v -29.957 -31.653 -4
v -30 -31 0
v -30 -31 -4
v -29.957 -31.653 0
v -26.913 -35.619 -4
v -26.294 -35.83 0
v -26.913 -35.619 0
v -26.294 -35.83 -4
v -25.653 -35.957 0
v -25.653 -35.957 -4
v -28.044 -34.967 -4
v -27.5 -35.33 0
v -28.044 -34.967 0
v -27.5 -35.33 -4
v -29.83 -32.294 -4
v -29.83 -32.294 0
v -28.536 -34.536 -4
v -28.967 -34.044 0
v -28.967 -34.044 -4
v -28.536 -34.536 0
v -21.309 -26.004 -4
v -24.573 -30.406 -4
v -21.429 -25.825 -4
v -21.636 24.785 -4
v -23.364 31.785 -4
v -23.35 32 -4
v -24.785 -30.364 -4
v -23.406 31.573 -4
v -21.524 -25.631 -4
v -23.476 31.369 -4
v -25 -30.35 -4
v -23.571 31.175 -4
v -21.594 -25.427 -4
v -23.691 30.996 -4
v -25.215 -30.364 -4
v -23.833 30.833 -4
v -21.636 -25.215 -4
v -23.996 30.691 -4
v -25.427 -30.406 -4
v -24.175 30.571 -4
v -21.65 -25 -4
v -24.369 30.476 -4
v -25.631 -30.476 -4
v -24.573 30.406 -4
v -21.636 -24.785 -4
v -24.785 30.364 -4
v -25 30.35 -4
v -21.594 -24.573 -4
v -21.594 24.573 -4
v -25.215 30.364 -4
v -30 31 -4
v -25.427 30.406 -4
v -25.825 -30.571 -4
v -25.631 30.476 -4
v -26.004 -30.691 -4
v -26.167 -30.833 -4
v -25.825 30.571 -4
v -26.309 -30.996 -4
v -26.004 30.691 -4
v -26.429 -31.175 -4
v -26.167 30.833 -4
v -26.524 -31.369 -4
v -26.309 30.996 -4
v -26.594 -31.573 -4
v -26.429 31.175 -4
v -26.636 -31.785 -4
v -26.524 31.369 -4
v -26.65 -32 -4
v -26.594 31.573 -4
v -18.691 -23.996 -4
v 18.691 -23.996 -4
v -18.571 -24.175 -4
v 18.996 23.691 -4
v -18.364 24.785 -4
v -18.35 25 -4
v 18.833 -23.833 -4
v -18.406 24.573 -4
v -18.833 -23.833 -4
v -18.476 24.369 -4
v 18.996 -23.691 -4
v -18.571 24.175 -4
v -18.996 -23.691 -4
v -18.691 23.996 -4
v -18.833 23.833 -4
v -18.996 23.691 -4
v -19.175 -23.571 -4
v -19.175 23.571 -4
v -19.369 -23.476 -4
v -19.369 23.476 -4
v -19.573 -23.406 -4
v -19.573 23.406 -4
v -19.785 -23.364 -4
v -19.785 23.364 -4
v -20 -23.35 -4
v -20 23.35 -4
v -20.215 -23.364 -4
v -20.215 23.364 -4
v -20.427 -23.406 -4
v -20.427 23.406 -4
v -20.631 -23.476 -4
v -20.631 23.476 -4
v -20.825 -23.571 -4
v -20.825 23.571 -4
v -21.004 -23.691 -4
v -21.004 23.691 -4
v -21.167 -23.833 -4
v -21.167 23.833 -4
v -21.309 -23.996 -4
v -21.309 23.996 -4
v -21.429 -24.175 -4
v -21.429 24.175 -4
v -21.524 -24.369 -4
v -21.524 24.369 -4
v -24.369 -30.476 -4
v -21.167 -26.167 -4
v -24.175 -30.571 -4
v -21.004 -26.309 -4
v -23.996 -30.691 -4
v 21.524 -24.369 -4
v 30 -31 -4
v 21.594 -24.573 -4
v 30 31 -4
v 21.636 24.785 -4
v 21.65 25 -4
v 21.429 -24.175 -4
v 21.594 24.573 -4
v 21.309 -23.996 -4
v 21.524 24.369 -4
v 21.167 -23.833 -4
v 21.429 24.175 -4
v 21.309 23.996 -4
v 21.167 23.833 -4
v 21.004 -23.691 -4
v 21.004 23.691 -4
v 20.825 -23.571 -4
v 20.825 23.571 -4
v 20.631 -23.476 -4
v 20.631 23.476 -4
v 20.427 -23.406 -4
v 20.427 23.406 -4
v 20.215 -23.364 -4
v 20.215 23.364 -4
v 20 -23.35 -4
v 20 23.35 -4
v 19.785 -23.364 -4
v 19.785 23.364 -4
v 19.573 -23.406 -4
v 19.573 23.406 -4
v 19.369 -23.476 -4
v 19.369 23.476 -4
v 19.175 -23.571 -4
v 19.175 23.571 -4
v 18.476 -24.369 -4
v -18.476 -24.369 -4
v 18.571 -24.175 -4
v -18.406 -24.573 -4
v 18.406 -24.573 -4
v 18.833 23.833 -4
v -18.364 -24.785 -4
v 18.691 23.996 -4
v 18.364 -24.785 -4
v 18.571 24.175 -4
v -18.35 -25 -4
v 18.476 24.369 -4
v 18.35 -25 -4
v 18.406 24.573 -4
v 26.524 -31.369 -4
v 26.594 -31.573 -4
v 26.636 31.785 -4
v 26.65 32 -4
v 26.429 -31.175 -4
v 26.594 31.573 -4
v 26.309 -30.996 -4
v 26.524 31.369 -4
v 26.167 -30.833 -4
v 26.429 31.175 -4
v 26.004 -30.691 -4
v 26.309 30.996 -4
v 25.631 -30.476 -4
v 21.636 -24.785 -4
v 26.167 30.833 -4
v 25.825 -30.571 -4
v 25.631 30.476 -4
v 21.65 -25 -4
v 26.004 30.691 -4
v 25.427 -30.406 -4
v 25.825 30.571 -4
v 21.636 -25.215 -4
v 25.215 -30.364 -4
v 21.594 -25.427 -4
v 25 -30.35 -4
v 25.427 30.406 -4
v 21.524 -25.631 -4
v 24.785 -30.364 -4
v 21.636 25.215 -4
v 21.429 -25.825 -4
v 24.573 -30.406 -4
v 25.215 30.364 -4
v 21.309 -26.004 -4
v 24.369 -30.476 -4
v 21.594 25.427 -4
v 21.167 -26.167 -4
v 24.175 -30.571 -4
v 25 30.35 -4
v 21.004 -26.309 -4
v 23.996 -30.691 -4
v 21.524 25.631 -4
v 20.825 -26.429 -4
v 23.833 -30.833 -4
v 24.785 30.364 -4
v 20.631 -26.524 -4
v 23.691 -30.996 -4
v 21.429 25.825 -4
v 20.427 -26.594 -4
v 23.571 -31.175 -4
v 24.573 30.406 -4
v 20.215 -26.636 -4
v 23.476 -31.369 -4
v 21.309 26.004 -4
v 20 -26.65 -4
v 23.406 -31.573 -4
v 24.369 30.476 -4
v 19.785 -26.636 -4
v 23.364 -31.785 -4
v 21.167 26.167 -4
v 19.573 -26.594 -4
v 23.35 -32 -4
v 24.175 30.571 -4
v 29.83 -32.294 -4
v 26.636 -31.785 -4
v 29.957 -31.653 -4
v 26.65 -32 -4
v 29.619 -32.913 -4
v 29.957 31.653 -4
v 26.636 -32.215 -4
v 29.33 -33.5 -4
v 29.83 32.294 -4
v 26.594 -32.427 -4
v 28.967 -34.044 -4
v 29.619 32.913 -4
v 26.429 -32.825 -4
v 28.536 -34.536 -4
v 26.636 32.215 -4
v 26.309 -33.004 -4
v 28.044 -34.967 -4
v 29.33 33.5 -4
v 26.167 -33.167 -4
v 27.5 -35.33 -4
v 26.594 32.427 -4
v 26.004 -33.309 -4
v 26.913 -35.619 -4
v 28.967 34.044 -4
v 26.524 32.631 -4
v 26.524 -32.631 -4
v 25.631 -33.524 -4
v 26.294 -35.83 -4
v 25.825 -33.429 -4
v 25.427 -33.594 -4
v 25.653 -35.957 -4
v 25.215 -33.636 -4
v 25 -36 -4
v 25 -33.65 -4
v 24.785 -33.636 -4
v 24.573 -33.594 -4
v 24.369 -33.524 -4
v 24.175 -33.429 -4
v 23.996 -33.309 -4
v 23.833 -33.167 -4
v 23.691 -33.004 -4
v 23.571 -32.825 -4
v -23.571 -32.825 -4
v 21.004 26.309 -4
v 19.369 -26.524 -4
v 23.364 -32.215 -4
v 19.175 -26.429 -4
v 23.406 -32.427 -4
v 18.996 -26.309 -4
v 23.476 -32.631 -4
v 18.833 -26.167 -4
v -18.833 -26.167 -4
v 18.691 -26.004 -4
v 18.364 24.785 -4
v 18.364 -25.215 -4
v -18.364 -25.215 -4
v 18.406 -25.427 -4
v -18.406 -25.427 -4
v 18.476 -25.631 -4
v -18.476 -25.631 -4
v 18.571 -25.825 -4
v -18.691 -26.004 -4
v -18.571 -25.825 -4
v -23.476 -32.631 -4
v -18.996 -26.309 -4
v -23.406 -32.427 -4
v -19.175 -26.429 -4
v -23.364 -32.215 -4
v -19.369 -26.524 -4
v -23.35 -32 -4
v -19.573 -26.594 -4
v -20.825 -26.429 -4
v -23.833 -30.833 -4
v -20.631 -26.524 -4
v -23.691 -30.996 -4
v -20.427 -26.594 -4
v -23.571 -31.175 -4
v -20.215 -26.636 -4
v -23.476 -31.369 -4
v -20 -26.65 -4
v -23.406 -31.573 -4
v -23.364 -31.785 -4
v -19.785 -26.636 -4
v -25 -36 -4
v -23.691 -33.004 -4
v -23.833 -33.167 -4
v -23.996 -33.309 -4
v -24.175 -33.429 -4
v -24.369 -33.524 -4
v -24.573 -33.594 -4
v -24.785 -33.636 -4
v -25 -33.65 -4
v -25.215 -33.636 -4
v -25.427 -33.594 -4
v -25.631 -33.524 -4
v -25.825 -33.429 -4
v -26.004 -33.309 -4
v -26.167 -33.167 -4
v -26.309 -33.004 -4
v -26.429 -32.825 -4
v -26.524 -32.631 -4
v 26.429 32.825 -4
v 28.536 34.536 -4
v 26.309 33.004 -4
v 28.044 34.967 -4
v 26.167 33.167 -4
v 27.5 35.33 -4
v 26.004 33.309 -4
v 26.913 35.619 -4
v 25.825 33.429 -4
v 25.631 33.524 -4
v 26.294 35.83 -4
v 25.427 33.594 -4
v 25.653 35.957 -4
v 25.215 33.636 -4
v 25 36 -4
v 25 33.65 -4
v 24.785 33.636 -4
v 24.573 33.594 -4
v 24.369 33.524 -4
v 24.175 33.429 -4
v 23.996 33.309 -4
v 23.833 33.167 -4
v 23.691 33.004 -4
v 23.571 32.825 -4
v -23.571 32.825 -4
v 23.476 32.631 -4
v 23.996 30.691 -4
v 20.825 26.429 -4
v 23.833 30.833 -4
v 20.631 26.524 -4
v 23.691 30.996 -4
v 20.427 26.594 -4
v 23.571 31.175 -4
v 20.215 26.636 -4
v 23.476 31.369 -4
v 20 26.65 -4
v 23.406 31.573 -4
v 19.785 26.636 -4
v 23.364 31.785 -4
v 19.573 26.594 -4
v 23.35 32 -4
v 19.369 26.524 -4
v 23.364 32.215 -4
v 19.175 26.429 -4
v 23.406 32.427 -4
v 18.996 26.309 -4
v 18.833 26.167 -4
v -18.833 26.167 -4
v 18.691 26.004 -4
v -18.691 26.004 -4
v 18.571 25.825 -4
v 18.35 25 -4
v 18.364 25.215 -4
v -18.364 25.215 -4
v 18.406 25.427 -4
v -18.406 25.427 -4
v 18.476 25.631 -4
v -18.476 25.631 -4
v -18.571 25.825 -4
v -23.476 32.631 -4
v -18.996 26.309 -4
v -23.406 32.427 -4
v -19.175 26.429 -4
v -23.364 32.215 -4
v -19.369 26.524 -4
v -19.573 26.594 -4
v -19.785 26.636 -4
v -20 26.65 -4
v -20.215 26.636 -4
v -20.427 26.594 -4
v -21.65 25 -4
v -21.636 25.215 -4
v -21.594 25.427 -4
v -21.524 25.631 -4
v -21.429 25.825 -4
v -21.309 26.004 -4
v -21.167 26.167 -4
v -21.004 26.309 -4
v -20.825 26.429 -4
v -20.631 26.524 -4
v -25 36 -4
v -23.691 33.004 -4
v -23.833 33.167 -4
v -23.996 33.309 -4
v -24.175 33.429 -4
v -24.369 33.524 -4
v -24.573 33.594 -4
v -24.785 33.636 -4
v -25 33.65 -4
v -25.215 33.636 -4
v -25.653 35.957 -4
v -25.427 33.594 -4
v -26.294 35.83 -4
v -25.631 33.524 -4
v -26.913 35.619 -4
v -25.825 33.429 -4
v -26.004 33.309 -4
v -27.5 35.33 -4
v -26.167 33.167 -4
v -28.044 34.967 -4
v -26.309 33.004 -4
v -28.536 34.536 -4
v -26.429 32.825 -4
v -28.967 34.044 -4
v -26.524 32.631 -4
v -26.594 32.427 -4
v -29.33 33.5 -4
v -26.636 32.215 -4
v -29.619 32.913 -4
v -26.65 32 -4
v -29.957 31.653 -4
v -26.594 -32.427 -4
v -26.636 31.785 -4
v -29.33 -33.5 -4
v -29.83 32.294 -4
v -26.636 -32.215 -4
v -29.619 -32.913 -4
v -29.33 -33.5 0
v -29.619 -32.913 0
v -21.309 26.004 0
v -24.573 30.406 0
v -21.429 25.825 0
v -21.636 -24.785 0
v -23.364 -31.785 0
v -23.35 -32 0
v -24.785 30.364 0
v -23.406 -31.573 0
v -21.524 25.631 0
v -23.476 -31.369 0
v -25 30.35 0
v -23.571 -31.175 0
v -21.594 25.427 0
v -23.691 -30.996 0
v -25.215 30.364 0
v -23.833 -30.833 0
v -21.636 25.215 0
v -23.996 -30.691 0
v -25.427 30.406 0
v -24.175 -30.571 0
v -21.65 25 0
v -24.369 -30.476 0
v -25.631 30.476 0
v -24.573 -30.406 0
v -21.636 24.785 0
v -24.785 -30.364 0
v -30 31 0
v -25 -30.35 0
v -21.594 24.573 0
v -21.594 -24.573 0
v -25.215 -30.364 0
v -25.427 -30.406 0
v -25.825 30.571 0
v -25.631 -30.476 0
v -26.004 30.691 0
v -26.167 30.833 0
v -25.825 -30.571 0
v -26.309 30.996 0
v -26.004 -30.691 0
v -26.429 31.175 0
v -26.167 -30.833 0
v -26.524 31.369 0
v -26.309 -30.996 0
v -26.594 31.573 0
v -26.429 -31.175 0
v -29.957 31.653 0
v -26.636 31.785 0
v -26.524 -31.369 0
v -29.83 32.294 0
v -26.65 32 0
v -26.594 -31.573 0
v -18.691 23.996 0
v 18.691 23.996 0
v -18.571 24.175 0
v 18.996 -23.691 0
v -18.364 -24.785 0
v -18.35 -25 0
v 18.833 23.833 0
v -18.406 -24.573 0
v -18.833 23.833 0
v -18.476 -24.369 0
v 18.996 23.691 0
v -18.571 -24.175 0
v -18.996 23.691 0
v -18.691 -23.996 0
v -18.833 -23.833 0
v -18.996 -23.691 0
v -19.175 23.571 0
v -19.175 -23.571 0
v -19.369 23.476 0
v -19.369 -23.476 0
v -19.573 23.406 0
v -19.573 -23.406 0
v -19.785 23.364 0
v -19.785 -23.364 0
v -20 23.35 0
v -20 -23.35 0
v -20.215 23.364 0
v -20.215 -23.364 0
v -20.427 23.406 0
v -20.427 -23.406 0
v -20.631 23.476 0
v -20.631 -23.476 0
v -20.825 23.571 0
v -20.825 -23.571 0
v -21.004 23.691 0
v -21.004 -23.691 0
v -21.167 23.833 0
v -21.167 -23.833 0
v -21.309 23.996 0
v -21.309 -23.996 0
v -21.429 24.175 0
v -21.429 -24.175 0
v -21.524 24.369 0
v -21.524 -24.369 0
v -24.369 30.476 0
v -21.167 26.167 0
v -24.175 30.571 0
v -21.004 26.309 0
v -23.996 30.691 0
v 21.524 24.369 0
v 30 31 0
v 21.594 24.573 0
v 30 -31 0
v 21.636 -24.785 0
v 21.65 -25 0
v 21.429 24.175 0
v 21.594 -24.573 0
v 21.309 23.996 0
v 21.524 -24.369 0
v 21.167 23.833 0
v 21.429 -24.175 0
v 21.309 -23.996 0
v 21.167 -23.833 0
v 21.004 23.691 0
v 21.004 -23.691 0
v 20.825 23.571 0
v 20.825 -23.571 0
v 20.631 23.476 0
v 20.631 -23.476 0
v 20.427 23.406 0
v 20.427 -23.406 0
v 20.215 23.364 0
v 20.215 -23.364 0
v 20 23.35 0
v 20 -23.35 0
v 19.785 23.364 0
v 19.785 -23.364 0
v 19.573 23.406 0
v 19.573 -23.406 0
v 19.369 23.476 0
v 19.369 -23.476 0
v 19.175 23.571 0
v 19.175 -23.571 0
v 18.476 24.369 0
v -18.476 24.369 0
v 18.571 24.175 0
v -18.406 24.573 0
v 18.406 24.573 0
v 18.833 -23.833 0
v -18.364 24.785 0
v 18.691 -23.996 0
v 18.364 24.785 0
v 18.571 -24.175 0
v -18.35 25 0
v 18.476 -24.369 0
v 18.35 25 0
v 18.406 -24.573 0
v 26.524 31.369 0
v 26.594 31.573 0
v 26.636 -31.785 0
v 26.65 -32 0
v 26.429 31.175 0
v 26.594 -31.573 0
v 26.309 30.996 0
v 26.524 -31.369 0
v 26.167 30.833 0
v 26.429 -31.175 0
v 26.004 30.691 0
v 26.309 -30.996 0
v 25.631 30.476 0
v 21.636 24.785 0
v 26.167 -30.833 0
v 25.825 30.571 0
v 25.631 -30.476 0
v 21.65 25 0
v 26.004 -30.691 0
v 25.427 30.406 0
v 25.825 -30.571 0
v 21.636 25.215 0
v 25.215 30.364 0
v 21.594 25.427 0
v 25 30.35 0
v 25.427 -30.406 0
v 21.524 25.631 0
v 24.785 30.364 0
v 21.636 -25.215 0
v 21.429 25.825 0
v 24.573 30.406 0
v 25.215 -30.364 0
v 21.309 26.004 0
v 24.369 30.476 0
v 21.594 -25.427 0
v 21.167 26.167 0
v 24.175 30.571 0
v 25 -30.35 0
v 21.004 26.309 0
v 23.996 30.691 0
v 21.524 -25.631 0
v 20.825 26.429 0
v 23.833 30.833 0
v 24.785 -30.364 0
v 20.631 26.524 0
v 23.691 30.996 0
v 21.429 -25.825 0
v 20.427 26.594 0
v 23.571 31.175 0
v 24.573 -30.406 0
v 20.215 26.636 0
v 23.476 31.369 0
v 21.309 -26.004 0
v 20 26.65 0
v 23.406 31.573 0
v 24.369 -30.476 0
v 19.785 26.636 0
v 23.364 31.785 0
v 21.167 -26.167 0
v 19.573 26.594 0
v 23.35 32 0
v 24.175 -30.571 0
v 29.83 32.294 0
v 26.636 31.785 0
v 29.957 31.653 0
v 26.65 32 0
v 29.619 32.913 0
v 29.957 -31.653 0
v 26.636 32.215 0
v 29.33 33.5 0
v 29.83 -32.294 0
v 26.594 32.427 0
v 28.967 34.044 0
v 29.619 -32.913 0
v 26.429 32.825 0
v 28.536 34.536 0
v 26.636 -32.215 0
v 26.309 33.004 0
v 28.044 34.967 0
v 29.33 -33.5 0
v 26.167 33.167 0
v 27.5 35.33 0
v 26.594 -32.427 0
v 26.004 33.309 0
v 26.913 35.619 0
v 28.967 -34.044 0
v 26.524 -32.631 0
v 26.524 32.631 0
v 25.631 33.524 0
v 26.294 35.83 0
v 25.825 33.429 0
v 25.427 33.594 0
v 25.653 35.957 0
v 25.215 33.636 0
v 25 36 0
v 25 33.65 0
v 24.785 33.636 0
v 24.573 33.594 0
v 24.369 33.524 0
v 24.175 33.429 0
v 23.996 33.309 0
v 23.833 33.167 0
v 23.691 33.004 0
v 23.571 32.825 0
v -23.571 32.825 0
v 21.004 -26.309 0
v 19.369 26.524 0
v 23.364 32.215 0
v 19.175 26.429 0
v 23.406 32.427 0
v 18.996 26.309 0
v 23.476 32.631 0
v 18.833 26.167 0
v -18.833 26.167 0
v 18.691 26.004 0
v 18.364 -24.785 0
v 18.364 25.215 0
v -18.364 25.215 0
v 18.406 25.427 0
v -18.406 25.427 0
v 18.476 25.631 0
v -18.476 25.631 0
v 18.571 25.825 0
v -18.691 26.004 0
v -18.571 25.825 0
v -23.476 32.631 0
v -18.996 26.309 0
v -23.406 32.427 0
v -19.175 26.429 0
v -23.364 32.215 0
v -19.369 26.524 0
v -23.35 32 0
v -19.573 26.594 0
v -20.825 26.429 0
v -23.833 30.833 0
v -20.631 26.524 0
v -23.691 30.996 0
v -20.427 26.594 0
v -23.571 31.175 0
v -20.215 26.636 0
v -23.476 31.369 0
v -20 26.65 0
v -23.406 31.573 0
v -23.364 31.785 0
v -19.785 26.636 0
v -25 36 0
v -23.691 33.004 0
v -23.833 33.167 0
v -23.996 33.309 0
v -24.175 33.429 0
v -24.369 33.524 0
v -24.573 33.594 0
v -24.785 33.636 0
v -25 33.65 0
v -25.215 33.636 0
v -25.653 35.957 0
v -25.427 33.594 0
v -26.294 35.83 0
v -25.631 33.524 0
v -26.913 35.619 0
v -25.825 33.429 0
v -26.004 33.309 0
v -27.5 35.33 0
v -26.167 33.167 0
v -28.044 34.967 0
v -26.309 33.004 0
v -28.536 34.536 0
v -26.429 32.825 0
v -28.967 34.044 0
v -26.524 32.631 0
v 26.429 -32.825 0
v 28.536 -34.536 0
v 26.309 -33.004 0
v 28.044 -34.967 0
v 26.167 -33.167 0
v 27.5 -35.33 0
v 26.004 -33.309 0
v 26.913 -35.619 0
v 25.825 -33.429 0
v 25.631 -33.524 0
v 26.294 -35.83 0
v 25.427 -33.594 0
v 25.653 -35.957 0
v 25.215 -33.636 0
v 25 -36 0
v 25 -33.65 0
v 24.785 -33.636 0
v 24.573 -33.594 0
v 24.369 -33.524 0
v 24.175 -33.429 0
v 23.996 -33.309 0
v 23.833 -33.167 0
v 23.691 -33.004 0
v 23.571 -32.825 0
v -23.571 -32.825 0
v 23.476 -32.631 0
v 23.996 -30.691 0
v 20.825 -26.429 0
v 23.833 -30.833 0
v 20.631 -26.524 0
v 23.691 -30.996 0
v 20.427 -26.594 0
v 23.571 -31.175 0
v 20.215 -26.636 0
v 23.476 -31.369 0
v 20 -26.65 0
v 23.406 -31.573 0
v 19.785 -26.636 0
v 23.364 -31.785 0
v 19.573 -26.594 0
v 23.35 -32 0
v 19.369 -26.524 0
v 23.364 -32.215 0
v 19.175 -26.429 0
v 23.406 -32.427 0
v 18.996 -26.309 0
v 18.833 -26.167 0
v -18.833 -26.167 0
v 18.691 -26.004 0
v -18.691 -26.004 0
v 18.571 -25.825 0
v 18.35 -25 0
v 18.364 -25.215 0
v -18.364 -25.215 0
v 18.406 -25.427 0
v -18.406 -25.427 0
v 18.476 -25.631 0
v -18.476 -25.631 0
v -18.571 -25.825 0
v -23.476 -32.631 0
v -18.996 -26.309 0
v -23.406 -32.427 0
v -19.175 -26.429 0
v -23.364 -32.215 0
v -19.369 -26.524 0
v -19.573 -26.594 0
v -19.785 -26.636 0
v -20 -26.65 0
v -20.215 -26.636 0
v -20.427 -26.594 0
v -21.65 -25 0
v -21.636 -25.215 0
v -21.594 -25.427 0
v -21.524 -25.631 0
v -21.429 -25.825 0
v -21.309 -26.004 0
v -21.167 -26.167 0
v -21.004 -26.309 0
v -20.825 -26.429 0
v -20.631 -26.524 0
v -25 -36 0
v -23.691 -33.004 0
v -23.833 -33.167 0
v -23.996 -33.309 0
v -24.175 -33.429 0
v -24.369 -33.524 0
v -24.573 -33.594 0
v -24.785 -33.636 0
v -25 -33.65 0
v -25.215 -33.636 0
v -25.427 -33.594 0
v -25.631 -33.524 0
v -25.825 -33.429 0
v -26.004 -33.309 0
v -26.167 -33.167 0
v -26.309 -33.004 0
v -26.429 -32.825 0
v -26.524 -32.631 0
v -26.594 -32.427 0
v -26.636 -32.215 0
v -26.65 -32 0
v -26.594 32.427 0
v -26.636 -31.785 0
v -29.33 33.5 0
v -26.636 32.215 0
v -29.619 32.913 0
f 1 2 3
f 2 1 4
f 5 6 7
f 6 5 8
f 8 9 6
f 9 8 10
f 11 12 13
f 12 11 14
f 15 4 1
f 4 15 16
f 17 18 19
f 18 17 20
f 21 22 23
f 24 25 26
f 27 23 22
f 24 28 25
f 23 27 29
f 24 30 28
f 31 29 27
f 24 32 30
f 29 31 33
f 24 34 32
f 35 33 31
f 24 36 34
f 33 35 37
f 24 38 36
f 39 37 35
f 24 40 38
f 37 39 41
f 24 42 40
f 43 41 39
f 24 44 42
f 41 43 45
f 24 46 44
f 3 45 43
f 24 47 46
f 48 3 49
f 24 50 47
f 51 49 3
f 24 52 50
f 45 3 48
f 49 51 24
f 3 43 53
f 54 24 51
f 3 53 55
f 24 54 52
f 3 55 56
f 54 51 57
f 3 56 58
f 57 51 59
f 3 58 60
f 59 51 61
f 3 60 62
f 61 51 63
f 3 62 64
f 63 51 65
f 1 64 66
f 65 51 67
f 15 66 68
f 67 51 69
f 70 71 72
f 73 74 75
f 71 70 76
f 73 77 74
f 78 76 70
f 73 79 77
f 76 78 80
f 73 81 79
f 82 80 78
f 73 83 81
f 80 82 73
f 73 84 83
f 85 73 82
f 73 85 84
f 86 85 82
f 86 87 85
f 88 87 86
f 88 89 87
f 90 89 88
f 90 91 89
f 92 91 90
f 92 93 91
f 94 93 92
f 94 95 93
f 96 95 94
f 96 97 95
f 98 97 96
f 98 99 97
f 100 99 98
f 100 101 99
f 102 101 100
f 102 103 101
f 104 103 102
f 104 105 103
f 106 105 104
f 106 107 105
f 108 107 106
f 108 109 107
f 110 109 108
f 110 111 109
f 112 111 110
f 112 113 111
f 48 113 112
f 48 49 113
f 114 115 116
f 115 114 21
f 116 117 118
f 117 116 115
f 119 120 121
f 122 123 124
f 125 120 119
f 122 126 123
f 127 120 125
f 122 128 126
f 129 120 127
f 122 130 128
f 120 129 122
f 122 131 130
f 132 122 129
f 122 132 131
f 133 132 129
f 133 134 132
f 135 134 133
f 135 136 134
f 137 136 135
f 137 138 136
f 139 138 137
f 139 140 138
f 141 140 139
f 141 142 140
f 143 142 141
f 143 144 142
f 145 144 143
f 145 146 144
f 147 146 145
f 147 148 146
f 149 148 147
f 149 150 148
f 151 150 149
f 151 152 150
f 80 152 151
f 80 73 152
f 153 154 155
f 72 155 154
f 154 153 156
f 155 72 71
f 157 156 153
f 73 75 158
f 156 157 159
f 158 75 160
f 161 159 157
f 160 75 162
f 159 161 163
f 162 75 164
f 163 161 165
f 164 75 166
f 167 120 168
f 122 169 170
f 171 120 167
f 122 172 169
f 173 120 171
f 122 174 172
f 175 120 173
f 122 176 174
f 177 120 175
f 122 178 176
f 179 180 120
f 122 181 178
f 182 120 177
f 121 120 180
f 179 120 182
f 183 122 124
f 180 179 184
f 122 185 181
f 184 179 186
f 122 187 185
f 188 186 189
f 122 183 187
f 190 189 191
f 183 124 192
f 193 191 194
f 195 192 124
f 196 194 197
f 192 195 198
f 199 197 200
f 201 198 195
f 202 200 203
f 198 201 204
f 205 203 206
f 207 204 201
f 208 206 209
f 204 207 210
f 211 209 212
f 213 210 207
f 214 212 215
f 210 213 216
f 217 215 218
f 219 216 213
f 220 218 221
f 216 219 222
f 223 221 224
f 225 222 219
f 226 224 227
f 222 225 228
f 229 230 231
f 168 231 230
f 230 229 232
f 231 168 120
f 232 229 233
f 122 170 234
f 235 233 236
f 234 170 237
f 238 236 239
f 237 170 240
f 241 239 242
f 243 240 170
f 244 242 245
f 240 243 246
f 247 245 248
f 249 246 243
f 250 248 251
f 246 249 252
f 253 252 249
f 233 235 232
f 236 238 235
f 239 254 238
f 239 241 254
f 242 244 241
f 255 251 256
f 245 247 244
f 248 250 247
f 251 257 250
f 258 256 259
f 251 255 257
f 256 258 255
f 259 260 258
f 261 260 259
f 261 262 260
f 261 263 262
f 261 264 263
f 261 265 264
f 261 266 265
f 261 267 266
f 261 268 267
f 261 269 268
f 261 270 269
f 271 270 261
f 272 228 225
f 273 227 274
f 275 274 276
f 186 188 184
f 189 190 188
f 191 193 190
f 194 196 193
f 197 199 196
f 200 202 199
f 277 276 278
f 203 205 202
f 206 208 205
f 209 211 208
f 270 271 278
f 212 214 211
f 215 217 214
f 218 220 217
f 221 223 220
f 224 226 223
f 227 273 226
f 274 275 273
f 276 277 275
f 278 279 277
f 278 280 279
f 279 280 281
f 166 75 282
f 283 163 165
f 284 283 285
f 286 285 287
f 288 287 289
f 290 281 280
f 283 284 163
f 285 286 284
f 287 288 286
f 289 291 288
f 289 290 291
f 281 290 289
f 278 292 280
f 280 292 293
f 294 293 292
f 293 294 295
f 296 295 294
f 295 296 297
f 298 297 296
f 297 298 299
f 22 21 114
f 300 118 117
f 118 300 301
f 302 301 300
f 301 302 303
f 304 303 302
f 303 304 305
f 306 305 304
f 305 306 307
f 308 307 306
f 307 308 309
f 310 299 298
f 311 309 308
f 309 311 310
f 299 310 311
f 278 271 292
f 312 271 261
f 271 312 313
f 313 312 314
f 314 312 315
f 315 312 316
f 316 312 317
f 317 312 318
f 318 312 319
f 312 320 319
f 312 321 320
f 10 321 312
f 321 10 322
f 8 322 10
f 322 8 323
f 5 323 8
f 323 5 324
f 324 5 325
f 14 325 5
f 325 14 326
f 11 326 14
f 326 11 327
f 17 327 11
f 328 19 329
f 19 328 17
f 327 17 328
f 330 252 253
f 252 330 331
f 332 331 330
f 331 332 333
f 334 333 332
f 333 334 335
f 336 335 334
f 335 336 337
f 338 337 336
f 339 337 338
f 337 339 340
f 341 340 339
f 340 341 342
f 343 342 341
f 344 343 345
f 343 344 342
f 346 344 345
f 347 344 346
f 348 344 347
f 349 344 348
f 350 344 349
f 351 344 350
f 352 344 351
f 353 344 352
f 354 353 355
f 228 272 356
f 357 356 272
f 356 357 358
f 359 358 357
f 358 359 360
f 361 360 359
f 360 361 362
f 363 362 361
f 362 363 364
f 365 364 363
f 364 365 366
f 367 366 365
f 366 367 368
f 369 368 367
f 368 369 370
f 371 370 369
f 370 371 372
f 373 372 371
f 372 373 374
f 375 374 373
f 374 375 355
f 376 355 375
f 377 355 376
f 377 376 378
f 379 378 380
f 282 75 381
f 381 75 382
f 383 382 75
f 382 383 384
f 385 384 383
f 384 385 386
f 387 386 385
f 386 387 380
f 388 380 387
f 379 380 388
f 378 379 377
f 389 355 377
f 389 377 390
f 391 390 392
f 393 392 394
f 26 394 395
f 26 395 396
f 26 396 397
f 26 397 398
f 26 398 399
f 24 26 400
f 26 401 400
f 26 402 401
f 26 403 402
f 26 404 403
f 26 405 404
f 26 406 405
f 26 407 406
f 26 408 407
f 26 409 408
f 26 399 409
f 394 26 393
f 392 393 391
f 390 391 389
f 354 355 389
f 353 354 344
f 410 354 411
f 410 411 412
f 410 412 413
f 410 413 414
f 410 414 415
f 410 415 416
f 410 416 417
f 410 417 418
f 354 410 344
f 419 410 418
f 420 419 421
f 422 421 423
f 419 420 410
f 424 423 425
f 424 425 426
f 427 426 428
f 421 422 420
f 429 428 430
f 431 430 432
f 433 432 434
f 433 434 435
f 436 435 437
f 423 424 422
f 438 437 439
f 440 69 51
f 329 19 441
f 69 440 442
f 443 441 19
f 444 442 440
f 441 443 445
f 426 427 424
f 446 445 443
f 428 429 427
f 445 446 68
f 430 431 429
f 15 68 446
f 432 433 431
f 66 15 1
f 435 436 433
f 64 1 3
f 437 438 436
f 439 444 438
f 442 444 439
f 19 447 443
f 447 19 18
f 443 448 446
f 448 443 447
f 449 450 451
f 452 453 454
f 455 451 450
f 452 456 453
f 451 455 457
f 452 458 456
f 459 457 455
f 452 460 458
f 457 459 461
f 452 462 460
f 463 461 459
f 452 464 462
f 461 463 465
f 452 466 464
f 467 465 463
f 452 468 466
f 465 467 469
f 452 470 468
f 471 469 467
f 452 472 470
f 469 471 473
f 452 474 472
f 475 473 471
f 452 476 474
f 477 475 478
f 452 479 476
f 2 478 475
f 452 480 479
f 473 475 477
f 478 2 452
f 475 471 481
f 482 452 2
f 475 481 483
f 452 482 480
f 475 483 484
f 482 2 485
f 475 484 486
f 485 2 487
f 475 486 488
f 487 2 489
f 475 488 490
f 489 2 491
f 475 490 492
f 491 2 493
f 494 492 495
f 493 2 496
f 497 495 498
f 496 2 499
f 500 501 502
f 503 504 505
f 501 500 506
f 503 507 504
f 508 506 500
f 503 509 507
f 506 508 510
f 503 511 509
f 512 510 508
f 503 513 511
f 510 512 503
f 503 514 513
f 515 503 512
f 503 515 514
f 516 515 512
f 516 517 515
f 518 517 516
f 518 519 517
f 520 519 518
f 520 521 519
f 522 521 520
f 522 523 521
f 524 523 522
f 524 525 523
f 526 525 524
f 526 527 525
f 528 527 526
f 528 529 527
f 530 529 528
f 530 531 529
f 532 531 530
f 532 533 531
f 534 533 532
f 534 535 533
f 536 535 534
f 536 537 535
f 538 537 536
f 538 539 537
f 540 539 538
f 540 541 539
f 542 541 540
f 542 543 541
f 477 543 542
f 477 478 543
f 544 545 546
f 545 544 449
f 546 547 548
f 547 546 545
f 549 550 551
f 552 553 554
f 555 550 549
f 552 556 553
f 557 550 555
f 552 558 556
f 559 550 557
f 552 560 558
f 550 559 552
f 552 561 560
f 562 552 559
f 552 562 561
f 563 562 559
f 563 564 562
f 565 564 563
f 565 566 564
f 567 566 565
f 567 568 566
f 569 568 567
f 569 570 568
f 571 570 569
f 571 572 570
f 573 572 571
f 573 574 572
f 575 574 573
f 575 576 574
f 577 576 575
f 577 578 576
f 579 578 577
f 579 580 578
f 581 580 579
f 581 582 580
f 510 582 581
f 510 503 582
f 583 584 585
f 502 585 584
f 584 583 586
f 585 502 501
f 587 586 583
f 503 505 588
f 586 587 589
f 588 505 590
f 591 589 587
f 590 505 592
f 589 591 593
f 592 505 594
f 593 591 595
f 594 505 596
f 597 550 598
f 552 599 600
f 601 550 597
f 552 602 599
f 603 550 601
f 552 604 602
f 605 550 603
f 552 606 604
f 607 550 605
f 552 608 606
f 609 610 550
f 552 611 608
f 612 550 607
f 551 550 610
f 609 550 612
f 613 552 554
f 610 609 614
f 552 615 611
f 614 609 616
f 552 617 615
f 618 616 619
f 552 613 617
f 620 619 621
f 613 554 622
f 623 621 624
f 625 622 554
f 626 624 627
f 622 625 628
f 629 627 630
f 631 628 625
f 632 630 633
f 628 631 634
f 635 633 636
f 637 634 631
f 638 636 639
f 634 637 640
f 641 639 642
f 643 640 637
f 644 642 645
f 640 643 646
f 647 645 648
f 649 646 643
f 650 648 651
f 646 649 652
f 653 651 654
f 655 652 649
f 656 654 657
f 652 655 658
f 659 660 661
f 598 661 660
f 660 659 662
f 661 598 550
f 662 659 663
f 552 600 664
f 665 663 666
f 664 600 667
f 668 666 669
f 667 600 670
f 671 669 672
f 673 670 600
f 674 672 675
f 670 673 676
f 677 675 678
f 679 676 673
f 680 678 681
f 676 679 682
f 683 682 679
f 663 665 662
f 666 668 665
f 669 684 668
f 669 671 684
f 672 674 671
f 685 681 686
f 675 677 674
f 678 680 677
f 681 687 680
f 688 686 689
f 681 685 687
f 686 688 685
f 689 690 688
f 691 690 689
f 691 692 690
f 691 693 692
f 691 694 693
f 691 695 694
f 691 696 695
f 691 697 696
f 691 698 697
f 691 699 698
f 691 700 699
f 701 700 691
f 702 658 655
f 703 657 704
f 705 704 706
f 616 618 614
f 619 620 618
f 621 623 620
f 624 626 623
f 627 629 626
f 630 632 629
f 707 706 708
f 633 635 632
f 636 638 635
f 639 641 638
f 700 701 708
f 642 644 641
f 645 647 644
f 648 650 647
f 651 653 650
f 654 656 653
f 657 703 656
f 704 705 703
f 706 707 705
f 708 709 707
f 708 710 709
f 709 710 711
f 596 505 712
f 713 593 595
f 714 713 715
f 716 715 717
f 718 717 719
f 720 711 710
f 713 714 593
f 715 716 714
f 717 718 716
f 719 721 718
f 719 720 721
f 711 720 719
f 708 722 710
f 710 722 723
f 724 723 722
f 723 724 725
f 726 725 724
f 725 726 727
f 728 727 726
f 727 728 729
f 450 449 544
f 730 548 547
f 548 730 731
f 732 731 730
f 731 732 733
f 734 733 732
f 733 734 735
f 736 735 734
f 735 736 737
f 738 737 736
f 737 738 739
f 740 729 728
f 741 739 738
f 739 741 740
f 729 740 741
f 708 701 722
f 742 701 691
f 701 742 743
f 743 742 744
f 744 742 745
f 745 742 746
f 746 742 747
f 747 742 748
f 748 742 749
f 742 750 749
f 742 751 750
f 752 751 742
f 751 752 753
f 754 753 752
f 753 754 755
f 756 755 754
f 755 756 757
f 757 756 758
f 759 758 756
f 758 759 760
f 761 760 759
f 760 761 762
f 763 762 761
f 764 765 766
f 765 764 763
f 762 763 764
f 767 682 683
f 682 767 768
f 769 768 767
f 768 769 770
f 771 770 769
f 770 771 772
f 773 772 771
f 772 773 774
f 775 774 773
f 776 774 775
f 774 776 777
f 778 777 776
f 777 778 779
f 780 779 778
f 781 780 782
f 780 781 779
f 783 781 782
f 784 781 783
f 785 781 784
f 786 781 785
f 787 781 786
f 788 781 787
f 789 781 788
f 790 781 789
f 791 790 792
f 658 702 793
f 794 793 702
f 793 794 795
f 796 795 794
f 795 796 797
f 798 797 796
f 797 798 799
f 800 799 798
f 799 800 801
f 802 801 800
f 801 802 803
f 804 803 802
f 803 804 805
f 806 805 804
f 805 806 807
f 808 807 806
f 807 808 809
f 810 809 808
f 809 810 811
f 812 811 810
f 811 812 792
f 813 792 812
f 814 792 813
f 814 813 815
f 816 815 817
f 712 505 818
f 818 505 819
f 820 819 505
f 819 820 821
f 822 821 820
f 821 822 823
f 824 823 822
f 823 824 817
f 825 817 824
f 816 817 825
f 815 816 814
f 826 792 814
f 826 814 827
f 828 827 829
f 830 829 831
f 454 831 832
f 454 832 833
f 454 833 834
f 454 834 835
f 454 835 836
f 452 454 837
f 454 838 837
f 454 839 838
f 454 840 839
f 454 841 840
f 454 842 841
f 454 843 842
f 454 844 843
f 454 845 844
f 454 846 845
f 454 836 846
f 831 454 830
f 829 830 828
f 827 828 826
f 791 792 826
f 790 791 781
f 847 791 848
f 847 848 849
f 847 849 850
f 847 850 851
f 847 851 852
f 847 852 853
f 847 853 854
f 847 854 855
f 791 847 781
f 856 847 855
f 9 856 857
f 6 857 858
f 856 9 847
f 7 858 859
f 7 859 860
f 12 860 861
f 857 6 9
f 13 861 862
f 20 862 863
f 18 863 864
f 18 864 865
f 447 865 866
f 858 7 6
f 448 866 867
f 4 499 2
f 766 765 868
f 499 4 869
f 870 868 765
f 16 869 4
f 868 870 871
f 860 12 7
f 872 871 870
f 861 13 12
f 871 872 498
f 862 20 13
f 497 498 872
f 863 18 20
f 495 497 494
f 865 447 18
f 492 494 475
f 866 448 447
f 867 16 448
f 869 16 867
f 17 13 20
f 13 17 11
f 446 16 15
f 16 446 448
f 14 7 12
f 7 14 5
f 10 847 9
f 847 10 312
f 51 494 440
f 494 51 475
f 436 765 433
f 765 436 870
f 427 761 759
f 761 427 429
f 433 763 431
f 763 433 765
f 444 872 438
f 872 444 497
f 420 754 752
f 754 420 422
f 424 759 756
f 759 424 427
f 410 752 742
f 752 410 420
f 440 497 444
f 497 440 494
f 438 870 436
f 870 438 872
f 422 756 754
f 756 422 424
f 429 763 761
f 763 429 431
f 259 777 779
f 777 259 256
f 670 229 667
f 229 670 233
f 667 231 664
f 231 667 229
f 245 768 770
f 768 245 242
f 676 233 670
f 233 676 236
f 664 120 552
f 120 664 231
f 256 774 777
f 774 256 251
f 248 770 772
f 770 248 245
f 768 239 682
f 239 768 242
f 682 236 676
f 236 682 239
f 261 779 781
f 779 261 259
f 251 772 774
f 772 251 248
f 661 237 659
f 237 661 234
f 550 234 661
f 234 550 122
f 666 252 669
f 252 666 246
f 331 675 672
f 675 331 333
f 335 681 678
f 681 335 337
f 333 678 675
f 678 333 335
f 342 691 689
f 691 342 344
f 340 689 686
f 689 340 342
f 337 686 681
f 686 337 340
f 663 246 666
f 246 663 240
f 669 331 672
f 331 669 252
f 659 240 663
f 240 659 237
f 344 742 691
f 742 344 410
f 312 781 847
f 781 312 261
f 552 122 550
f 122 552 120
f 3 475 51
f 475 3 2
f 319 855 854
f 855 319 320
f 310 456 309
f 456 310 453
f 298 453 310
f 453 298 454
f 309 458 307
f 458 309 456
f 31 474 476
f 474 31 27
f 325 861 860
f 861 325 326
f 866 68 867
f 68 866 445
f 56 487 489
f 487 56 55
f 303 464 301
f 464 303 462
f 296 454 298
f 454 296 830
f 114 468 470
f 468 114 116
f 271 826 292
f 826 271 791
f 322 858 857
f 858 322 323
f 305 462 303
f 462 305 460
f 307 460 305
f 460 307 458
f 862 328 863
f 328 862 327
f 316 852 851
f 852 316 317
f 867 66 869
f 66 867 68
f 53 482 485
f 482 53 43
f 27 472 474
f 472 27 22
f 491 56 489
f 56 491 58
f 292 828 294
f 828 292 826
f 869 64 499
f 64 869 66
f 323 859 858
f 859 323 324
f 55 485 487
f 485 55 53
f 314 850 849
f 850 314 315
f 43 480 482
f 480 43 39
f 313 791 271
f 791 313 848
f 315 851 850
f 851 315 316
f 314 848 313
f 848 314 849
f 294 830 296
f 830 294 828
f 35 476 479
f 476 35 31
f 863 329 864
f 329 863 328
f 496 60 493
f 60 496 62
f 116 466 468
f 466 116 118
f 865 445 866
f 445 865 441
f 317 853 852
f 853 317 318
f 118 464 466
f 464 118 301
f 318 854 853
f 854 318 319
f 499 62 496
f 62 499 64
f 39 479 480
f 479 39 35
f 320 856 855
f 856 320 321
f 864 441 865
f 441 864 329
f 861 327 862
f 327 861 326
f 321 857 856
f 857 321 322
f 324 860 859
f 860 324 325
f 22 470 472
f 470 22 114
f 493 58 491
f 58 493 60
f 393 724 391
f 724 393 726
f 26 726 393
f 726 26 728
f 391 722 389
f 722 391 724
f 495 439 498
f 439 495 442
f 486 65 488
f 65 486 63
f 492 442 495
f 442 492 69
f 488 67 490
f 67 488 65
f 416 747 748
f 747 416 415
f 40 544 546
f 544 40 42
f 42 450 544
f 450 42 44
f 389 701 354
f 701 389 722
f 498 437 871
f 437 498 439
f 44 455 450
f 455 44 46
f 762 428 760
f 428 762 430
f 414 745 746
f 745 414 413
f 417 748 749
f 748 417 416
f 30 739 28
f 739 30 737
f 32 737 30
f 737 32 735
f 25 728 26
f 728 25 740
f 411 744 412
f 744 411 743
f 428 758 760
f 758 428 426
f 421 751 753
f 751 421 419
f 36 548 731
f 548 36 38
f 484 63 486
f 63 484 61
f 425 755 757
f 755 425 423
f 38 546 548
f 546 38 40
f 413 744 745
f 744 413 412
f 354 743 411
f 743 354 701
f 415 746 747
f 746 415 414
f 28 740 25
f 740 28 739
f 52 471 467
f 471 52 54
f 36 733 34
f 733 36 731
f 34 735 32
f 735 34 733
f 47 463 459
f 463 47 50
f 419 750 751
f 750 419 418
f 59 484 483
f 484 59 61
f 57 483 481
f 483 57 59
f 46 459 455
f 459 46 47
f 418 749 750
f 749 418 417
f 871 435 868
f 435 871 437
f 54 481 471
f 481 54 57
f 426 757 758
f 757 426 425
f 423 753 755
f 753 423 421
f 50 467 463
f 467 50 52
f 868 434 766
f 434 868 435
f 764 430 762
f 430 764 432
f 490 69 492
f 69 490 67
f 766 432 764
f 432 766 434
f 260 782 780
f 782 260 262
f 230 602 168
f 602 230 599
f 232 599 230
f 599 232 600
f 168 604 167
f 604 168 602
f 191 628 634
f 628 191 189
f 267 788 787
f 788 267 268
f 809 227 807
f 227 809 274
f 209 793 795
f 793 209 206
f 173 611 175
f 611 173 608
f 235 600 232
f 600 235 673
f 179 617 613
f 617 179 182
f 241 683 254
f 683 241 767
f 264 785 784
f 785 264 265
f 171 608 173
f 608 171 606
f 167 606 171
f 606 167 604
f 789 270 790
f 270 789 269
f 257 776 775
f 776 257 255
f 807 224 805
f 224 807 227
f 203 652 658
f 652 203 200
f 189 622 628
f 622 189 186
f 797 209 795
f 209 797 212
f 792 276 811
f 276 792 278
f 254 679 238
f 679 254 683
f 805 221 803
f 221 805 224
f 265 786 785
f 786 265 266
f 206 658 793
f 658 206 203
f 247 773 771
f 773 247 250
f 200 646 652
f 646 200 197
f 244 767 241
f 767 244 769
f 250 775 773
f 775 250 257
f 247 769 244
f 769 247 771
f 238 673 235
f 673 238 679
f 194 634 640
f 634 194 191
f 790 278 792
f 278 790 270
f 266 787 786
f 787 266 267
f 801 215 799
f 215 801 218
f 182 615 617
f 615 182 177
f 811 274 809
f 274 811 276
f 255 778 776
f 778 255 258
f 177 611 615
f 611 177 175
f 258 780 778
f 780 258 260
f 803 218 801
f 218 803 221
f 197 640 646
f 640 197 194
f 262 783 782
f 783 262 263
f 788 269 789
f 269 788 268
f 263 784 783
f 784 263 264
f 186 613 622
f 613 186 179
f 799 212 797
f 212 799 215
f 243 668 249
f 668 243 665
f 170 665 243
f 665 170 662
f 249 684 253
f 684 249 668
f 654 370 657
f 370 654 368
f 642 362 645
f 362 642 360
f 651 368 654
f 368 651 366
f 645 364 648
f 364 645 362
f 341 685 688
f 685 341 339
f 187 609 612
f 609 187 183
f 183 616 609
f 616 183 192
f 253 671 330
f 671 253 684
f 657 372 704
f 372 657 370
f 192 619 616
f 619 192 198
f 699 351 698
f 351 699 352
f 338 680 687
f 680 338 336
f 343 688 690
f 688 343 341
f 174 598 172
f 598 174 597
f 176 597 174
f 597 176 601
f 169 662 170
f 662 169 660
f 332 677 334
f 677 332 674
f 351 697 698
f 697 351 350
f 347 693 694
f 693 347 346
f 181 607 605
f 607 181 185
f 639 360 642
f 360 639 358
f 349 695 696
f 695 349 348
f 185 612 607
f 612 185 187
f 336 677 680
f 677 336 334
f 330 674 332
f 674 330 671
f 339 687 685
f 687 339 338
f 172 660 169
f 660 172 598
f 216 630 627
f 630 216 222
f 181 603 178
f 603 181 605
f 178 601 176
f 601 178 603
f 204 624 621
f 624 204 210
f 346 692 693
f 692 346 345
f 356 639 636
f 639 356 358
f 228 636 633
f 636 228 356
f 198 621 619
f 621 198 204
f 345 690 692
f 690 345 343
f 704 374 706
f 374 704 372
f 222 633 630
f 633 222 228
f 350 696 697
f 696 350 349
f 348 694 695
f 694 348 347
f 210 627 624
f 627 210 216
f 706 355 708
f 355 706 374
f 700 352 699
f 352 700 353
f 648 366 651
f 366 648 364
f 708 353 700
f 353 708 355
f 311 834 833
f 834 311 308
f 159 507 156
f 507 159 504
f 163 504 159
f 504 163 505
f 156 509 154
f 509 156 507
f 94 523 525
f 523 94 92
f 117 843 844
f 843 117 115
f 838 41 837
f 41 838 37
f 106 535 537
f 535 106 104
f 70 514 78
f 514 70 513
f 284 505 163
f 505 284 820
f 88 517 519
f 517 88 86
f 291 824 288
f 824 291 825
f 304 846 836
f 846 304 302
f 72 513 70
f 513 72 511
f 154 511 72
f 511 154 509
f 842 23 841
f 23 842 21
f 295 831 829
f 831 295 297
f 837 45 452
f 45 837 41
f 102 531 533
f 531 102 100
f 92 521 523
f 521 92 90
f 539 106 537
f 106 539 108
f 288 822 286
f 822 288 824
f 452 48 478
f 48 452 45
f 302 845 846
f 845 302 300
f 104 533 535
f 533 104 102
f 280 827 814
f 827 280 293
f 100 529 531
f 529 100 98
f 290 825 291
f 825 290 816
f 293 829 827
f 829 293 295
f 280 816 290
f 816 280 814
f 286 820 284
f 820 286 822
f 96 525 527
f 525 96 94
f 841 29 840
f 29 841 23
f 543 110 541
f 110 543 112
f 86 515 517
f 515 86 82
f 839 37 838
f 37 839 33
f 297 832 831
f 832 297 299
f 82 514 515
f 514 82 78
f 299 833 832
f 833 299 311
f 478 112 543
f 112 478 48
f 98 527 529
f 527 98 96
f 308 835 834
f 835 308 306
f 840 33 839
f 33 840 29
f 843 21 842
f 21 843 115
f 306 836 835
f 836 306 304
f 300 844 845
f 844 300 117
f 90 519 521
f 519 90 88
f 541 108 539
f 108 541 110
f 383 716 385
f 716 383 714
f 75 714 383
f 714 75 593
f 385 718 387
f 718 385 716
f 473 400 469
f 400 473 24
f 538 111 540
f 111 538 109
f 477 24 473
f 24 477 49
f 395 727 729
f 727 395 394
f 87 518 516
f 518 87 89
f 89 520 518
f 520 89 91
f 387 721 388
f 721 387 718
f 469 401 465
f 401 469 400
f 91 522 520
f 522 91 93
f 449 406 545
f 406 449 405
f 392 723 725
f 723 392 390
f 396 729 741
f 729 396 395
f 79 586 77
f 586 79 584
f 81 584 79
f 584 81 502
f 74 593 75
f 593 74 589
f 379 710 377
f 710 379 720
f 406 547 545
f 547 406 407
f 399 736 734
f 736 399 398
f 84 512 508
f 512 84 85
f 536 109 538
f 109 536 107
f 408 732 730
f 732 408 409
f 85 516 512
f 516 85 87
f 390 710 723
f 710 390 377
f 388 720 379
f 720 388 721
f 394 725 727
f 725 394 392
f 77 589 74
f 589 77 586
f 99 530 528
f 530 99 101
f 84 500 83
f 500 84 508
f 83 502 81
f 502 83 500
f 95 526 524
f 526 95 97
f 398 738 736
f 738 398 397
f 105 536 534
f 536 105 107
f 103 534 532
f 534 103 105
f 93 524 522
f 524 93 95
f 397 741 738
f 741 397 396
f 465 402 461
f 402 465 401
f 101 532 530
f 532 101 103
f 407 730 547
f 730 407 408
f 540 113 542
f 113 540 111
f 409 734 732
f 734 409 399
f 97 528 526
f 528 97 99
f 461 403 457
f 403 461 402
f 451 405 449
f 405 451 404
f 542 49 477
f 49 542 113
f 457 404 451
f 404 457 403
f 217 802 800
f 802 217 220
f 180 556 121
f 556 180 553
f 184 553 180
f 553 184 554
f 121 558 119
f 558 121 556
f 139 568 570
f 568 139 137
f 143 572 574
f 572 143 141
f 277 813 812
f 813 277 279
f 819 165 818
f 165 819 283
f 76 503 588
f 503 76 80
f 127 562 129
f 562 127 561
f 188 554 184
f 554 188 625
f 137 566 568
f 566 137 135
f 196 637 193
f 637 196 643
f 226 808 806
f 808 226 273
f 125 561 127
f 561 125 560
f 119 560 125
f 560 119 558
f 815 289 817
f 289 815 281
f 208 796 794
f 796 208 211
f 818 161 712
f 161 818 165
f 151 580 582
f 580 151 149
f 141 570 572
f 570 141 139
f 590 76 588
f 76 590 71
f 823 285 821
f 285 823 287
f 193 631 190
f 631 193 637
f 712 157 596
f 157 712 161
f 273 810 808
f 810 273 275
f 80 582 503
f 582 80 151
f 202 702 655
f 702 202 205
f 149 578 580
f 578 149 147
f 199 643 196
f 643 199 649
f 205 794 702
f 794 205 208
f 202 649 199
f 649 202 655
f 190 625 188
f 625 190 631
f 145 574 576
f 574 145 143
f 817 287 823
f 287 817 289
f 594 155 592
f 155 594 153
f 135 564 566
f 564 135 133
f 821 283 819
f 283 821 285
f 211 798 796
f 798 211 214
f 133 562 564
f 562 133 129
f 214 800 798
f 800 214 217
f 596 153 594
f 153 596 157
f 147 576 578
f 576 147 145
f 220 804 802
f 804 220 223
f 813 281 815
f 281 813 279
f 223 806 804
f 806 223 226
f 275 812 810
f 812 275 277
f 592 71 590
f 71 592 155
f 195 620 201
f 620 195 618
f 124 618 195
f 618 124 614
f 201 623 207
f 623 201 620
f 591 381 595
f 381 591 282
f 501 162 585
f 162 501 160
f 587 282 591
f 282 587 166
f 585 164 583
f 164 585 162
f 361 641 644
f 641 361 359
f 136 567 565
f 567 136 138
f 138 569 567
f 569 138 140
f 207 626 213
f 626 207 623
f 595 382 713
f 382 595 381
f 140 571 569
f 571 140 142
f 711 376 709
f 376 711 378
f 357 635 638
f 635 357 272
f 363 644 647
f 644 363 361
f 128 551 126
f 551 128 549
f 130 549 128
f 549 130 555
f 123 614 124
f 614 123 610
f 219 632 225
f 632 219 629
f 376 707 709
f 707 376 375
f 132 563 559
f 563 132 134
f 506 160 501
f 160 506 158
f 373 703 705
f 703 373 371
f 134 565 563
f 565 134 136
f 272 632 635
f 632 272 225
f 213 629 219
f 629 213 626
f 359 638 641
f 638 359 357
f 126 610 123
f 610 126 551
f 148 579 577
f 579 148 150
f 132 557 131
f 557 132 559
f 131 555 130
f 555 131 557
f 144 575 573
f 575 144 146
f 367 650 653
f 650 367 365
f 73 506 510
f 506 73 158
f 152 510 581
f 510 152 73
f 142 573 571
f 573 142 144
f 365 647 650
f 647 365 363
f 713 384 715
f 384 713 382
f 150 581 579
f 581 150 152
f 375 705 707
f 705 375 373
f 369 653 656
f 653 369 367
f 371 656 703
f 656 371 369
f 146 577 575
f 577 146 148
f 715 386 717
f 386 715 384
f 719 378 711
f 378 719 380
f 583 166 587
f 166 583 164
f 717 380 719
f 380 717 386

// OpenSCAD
// file: ../common/ds_lib.scad
// DronSwarm · librería común de piezas del frame (S07-S08). Unidades: mm.
//
// Reglas (ADR-003): sin hull()/minkowski()/offset() — FreeCAD los convierte en malla y el STEP deja de ser un
// sólido válido. Las formas redondeadas se arman con uniones de cubos y cilindros. El importador CSG de FreeCAD
// también falla con booleanas 2D y con varios operandos agrupados bajo una sola transformación: cada grupo de
// agujeros debe ser hijo directo del difference(), con su propio translate.
//
// Interfaz de motor DronSwarm (DMI, ADR-011): placa con 4 ranuras radiales a 90°, de modo que el mismo soporte
// acepta varios patrones comerciales y, más adelante, el motor propio (S17+) se diseña para caer en el mismo rango.
//   DMI-S: 4×M3, círculo de tornillos Ø16-Ø25 (motores 28xx-41xx, ≤ 600 W)
//   DMI-L: 4×M4, círculo de tornillos Ø30-Ø42 (motores 50xx-70xx, ≤ 2 kW)

$fn = 48;

M3 = 3.3; M3_HEAD = 6.0; M3_NUT = 6.4;     // pasante, cabeza, tuerca (entre caras + juego)
M4 = 4.4; M4_HEAD = 7.5;
M5 = 5.4;

function dmi_bolt(iface) = iface == "L" ? M4 : M3;
function dmi_r(iface) = iface == "L" ? [15, 21] : [8, 12.5];   // radio mínimo y máximo de las ranuras
function dmi_plate_d(iface) = iface == "L" ? 56 : 36;
function dmi_center(iface) = iface == "L" ? 16 : 10;            // eje, seguro y paso de cables

// Rectángulo con esquinas redondeadas (2D) y su extrusión
module rrect2d(size, r) {
    r2 = min(r, size[0] / 2 - 0.01, size[1] / 2 - 0.01);
    union() {
        translate([r2, 0]) square([size[0] - 2 * r2, size[1]]);
        translate([0, r2]) square([size[0], size[1] - 2 * r2]);
        for (x = [r2, size[0] - r2], y = [r2, size[1] - r2]) translate([x, y]) circle(r = r2);
    }
}
// Caja redondeada con primitivas 3D (sin booleanas 2D: el importador CSG de FreeCAD falla con ellas)
module rbox(size, r) {
    r2 = min(r, size[0] / 2 - 0.01, size[1] / 2 - 0.01);
    union() {
        translate([r2, 0, 0]) cube([size[0] - 2 * r2, size[1], size[2]]);
        translate([0, r2, 0]) cube([size[0], size[1] - 2 * r2, size[2]]);
        for (x = [r2, size[0] - r2], y = [r2, size[1] - r2]) translate([x, y, 0]) cylinder(r = r2, h = size[2]);
    }
}
module crbox(size, r) { translate([-size[0] / 2, -size[1] / 2, 0]) rbox(size, r); }   // centrado en x/y

// Ranura (2D) entre dos puntos sobre el eje x
module slot2d(r0, r1, w) {
    union() {
        translate([r0, -w / 2]) square([r1 - r0, w]);
        translate([r0, 0]) circle(d = w);
        translate([r1, 0]) circle(d = w);
    }
}

// Agujeros de la interfaz de motor (para restar de una placa de espesor t)
module slot3d(r0, r1, w, h) {
    union() {
        translate([r0, -w / 2, 0]) cube([r1 - r0, w, h]);
        translate([r0, 0, 0]) cylinder(d = w, h = h);
        translate([r1, 0, 0]) cylinder(d = w, h = h);
    }
}
module dmi_holes(iface, t) {
    r = dmi_r(iface);
    translate([0, 0, -1]) union() {
        cylinder(d = dmi_center(iface), h = t + 2);
        for (a = [45, 135, 225, 315]) rotate(a) slot3d(r[0], r[1], dmi_bolt(iface), t + 2);
    }
}

// Soporte de motor en la punta del brazo: manguito sobre el tubo + placa DMI arriba
//   el tubo entra por -x; la placa queda centrada en el eje del motor (origen), cara superior en z = 0
module motor_mount(tube_d, iface = "S", sleeve = 34, wall = 3.5) {
    od = tube_d + 2 * wall;
    pd = dmi_plate_d(iface);
    pt = iface == "L" ? 6 : 4;
    zc = -pt - tube_d / 2 - 1;                 // eje del tubo bajo la placa
    difference() {
        union() {
            translate([0, 0, -pt]) cylinder(d = pd, h = pt);                         // placa DMI
            translate([-sleeve - pd / 2 + 6, 0, zc]) rotate([0, 90, 0])
                cylinder(d = od, h = sleeve + pd / 2 - 6 + 4);                       // manguito
            translate([-sleeve - pd / 2 + 6, -od / 2, zc]) cube([sleeve + pd / 2 - 2, od, -zc - pt + 0.01]);  // alma
            translate([-sleeve - pd / 2 + 6, -5, zc - od / 2 - 7]) cube([sleeve, 10, 8]);   // oreja de apriete
        }
        dmi_holes(iface, pt + 0.02, $fn = 32);
        translate([-sleeve - pd / 2 + 5, 0, zc]) rotate([0, 90, 0]) cylinder(d = tube_d + 0.3, h = sleeve + pd / 2 - 3); // tubo
        translate([-sleeve - pd / 2 + 4, -1, zc - od / 2 - 8]) cube([sleeve + 1, 2, od / 2 + 6]);   // ranura de apriete
        for (x = [0.3, 0.75]) translate([-sleeve - pd / 2 + 6 + x * sleeve, 0, zc - od / 2 - 3])
            rotate([90, 0, 0]) cylinder(d = M3, h = 30, center = true);                // tornillos de apriete
        translate([-pd / 2 - 2, 0, zc]) rotate([0, 90, 0]) cylinder(d = 7, h = pd);   // salida de cables del tubo
    }
}

// Bloque de brazo entre las dos placas centrales (impreso PA12-CF): sujeta el tubo y separa las placas.
//   el tubo sale por +x desde el origen; el bloque ocupa x ∈ [-len, 0], altura = gap
module arm_block(tube_d, gap, len = 40, width = 0, bolt = M3) {
    w = width > 0 ? width : tube_d + 14;
    difference() {
        translate([-len, -w / 2, 0]) rbox([len, w, gap], 2);
        translate([-len - 1, 0, gap / 2]) rotate([0, 90, 0]) cylinder(d = tube_d + 0.2, h = len + 2);   // tubo
        translate([-len - 1, -0.75, gap / 2]) cube([len + 2, 1.5, gap / 2 + 1]);                        // ranura de apriete
        for (p = arm_block_bolts(tube_d, len, w)) translate([p[0], p[1], -1]) cylinder(d = bolt, h = gap + 2);
        translate([-len * 0.5, 0, gap * 0.78]) rotate([90, 0, 0]) cylinder(d = M3, h = w + 2, center = true);  // apriete
    }
}
function arm_block_bolts(tube_d, len, w) =
    [for (x = [-len + 6, -6], y = [-(w / 2 - 3.6), w / 2 - 3.6]) [x, y]];

// Patrón de controladora de vuelo (agujeros M3 en cuadrado)
module fc_holes(pattern, t) {
    for (x = [-1, 1], y = [-1, 1]) translate([x * pattern / 2, y * pattern / 2, -1]) cylinder(d = M3, h = t + 2);
}
// file: ds_i_params.scad
// DS-I · parámetros generados por tools/cad/gen_cad_params.py el 2026-10-19
// desde engineering/data/results (spec v1). No editar a mano: regenerar. Unidades: mm, kg.

vehicle = "DS-I";
rotors = 4;
wheelbase = 672;
arm_radius = 336;
prop_d = 431.8;
tube_od = 20;
tube_wall = 1;
arm_len = 252;
plate_d = 168;
plate_t = 3;
plate_gap = 26;
motor_iface = "S";
battery_dims = [134.4, 76.2, 48.8];
battery = "6S2P 50S";
leg_h = 160;
fold_arms = false;
mtow_kg = 2.695;
motor_mass_kg = 0.074;
fc_pattern = 30.5;
gimbal_box = [90, 70, 105];
gimbal_damper_pitch = [60, 50];
// file: ds_i_frame.scad
// DS-I · geometría compartida del frame: posiciones derivadas de los parámetros (spec v1). Unidades: mm.
// Ejes: x adelante, y izquierda, z arriba. z = 0 es la cara superior de la placa inferior.
// Cada pieza vive en su propio archivo (center_plate.scad, arm_block.scad, …) e incluye este.

include <ds_i_params.scad>
use <../common/ds_lib.scad>
include <../common/ds_lib.scad>

arm_angles = [45, 135, 225, 315];         // quad X
block_len = 40;
block_w = tube_od + 14;
r_block_out = plate_d / 2 - 3;            // extremo exterior del bloque de brazo
tube_z = plate_gap / 2;                   // eje de los tubos
tube_len = arm_radius - r_block_out + block_len - 8;   // dentro del bloque hasta el soporte de motor
leg_offset = 70;                          // patas abrazadas al brazo, a esta distancia del bloque
leg_r = r_block_out + leg_offset;
leg_tube = 12;                            // tubo de las patas Ø12×1
battery_pos = [-28, 0];                   // batería transversal, atrás, bajo la placa
gimbal_pos = [62, 0];                     // cámara adelante, colgada con amortiguadores
housing_size = [120, 90, 58];             // carcasa IP54 sobre la placa superior
housing_pos = [0, 0];

// Contorno de las placas centrales (2D): círculo con lóbulos bajo cada bloque de brazo
module plate_outline() {
    union() {
        circle(d = plate_d, $fn = 96);
        for (a = arm_angles) rotate(a) translate([r_block_out - block_len - 4, -block_w / 2 - 4]) square([block_len + 7, block_w + 8]);
    }
}

// Agujeros comunes a ambas placas: tornillos de los bloques
module plate_common_holes() {
    for (a = arm_angles) rotate(a) translate([r_block_out, 0])
        for (p = arm_block_bolts(tube_od, block_len, block_w)) translate(p) circle(d = M3);
}

// Posiciones de piezas montadas en las placas
gimbal_mount_bolts = [for (x = [-25, 25], y = [-32, 32]) [gimbal_pos[0] - 15 + x, y]];   // adaptador bajo la placa
battery_tray_bolts = [for (x = [-30, 30], y = [-46, 46]) [battery_pos[0] + x, y]];
housing_flange = 10;
// tornillos de la brida a 6 mm de la pared (afuera del canal de la junta, que va de 0.6 a 2.6 mm)
housing_bolts = [[66, 0], [-66, 0], [0, 51], [0, -51], [40, 51], [40, -51], [-40, 51], [-40, -51]];
cable_gland_pos = [-housing_size[0] / 2 + 18, 0];      // paso de cables al interior de la carcasa (prensaestopa M12)
motor_d = motor_iface == "L" ? 62 : 38;   // motor de referencia (COTS, se confirma en S09)
motor_h = motor_iface == "L" ? 36 : 26;
tray_t = 3;                               // bandeja de batería
gm_t = 4;                                 // placas del adaptador de cámara
damper_h = 10;                            // amortiguadores de silicona
foot_h = 45;                              // pie amortiguador de TPU (≈ 30 mm de carrera)
foot_stroke = 30;
// Altura de las patas por condición de diseño: con el pie comprimido, la cámara no toca el suelo (10 mm de margen)
gimbal_bottom_z = -plate_t - 2 * gm_t - damper_h - gimbal_box[2];
ground_z = gimbal_bottom_z - foot_stroke - 10;
leg_top_z = tube_z - (tube_od + 8) / 2 - 2;     // tope del tubo de la pata dentro de la abrazadera
leg_len = (leg_top_z - ground_z) - (foot_h - 12);
mm_sleeve = 26;                           // manguito del soporte de motor (FEA: FS 37 con 34 mm, se acorta)
// main file
// DS-I · adaptador de cámara con 4 amortiguadores de silicona (placas impresas PA12-CF). Aísla la cámara de la
// vibración de los motores (1P ≈ 52 Hz en hover): amortiguadores 30-40 Shore A, frecuencia propia ≈ 10-15 Hz.
//   which = "top" (va contra la placa del frame) | "bottom" (lleva la cámara)
// Local: cara superior del adaptador en z = 0; los amortiguadores ocupan z ∈ [−t − damper_h, −t].
include <ds_i_frame.scad>
which = "top";
damper_pts = [for (x = [-1, 1], y = [-1, 1]) [x * 20, y * 25]];
module gimbal_plate(which) {
    if (which == "top")
        difference() {
            translate([0, 0, -gm_t]) crbox([60, 72, gm_t], 5);
            for (p = gimbal_mount_bolts) translate([p[0] - (gimbal_pos[0] - 15), p[1], -gm_t - 1]) cylinder(d = M3, h = gm_t + 2);
            for (p = damper_pts) translate([p[0], p[1], -gm_t - 1]) cylinder(d = M3, h = gm_t + 2);
        }
    else
        difference() {
            translate([15, 0, -2 * gm_t - damper_h]) crbox([90, 72, gm_t], 5);
            for (p = damper_pts) translate([p[0], p[1], -2 * gm_t - damper_h - 1]) cylinder(d = M3, h = gm_t + 2);
            for (y = [-1, 1]) translate([15, y * 31, -2 * gm_t - damper_h - 1]) cylinder(d = M3, h = gm_t + 2);   // cámara
            translate([15, 0, -2 * gm_t - damper_h - 1]) cylinder(d = 20, h = gm_t + 2);       // paso de cable
        }
}
gimbal_plate(which);
